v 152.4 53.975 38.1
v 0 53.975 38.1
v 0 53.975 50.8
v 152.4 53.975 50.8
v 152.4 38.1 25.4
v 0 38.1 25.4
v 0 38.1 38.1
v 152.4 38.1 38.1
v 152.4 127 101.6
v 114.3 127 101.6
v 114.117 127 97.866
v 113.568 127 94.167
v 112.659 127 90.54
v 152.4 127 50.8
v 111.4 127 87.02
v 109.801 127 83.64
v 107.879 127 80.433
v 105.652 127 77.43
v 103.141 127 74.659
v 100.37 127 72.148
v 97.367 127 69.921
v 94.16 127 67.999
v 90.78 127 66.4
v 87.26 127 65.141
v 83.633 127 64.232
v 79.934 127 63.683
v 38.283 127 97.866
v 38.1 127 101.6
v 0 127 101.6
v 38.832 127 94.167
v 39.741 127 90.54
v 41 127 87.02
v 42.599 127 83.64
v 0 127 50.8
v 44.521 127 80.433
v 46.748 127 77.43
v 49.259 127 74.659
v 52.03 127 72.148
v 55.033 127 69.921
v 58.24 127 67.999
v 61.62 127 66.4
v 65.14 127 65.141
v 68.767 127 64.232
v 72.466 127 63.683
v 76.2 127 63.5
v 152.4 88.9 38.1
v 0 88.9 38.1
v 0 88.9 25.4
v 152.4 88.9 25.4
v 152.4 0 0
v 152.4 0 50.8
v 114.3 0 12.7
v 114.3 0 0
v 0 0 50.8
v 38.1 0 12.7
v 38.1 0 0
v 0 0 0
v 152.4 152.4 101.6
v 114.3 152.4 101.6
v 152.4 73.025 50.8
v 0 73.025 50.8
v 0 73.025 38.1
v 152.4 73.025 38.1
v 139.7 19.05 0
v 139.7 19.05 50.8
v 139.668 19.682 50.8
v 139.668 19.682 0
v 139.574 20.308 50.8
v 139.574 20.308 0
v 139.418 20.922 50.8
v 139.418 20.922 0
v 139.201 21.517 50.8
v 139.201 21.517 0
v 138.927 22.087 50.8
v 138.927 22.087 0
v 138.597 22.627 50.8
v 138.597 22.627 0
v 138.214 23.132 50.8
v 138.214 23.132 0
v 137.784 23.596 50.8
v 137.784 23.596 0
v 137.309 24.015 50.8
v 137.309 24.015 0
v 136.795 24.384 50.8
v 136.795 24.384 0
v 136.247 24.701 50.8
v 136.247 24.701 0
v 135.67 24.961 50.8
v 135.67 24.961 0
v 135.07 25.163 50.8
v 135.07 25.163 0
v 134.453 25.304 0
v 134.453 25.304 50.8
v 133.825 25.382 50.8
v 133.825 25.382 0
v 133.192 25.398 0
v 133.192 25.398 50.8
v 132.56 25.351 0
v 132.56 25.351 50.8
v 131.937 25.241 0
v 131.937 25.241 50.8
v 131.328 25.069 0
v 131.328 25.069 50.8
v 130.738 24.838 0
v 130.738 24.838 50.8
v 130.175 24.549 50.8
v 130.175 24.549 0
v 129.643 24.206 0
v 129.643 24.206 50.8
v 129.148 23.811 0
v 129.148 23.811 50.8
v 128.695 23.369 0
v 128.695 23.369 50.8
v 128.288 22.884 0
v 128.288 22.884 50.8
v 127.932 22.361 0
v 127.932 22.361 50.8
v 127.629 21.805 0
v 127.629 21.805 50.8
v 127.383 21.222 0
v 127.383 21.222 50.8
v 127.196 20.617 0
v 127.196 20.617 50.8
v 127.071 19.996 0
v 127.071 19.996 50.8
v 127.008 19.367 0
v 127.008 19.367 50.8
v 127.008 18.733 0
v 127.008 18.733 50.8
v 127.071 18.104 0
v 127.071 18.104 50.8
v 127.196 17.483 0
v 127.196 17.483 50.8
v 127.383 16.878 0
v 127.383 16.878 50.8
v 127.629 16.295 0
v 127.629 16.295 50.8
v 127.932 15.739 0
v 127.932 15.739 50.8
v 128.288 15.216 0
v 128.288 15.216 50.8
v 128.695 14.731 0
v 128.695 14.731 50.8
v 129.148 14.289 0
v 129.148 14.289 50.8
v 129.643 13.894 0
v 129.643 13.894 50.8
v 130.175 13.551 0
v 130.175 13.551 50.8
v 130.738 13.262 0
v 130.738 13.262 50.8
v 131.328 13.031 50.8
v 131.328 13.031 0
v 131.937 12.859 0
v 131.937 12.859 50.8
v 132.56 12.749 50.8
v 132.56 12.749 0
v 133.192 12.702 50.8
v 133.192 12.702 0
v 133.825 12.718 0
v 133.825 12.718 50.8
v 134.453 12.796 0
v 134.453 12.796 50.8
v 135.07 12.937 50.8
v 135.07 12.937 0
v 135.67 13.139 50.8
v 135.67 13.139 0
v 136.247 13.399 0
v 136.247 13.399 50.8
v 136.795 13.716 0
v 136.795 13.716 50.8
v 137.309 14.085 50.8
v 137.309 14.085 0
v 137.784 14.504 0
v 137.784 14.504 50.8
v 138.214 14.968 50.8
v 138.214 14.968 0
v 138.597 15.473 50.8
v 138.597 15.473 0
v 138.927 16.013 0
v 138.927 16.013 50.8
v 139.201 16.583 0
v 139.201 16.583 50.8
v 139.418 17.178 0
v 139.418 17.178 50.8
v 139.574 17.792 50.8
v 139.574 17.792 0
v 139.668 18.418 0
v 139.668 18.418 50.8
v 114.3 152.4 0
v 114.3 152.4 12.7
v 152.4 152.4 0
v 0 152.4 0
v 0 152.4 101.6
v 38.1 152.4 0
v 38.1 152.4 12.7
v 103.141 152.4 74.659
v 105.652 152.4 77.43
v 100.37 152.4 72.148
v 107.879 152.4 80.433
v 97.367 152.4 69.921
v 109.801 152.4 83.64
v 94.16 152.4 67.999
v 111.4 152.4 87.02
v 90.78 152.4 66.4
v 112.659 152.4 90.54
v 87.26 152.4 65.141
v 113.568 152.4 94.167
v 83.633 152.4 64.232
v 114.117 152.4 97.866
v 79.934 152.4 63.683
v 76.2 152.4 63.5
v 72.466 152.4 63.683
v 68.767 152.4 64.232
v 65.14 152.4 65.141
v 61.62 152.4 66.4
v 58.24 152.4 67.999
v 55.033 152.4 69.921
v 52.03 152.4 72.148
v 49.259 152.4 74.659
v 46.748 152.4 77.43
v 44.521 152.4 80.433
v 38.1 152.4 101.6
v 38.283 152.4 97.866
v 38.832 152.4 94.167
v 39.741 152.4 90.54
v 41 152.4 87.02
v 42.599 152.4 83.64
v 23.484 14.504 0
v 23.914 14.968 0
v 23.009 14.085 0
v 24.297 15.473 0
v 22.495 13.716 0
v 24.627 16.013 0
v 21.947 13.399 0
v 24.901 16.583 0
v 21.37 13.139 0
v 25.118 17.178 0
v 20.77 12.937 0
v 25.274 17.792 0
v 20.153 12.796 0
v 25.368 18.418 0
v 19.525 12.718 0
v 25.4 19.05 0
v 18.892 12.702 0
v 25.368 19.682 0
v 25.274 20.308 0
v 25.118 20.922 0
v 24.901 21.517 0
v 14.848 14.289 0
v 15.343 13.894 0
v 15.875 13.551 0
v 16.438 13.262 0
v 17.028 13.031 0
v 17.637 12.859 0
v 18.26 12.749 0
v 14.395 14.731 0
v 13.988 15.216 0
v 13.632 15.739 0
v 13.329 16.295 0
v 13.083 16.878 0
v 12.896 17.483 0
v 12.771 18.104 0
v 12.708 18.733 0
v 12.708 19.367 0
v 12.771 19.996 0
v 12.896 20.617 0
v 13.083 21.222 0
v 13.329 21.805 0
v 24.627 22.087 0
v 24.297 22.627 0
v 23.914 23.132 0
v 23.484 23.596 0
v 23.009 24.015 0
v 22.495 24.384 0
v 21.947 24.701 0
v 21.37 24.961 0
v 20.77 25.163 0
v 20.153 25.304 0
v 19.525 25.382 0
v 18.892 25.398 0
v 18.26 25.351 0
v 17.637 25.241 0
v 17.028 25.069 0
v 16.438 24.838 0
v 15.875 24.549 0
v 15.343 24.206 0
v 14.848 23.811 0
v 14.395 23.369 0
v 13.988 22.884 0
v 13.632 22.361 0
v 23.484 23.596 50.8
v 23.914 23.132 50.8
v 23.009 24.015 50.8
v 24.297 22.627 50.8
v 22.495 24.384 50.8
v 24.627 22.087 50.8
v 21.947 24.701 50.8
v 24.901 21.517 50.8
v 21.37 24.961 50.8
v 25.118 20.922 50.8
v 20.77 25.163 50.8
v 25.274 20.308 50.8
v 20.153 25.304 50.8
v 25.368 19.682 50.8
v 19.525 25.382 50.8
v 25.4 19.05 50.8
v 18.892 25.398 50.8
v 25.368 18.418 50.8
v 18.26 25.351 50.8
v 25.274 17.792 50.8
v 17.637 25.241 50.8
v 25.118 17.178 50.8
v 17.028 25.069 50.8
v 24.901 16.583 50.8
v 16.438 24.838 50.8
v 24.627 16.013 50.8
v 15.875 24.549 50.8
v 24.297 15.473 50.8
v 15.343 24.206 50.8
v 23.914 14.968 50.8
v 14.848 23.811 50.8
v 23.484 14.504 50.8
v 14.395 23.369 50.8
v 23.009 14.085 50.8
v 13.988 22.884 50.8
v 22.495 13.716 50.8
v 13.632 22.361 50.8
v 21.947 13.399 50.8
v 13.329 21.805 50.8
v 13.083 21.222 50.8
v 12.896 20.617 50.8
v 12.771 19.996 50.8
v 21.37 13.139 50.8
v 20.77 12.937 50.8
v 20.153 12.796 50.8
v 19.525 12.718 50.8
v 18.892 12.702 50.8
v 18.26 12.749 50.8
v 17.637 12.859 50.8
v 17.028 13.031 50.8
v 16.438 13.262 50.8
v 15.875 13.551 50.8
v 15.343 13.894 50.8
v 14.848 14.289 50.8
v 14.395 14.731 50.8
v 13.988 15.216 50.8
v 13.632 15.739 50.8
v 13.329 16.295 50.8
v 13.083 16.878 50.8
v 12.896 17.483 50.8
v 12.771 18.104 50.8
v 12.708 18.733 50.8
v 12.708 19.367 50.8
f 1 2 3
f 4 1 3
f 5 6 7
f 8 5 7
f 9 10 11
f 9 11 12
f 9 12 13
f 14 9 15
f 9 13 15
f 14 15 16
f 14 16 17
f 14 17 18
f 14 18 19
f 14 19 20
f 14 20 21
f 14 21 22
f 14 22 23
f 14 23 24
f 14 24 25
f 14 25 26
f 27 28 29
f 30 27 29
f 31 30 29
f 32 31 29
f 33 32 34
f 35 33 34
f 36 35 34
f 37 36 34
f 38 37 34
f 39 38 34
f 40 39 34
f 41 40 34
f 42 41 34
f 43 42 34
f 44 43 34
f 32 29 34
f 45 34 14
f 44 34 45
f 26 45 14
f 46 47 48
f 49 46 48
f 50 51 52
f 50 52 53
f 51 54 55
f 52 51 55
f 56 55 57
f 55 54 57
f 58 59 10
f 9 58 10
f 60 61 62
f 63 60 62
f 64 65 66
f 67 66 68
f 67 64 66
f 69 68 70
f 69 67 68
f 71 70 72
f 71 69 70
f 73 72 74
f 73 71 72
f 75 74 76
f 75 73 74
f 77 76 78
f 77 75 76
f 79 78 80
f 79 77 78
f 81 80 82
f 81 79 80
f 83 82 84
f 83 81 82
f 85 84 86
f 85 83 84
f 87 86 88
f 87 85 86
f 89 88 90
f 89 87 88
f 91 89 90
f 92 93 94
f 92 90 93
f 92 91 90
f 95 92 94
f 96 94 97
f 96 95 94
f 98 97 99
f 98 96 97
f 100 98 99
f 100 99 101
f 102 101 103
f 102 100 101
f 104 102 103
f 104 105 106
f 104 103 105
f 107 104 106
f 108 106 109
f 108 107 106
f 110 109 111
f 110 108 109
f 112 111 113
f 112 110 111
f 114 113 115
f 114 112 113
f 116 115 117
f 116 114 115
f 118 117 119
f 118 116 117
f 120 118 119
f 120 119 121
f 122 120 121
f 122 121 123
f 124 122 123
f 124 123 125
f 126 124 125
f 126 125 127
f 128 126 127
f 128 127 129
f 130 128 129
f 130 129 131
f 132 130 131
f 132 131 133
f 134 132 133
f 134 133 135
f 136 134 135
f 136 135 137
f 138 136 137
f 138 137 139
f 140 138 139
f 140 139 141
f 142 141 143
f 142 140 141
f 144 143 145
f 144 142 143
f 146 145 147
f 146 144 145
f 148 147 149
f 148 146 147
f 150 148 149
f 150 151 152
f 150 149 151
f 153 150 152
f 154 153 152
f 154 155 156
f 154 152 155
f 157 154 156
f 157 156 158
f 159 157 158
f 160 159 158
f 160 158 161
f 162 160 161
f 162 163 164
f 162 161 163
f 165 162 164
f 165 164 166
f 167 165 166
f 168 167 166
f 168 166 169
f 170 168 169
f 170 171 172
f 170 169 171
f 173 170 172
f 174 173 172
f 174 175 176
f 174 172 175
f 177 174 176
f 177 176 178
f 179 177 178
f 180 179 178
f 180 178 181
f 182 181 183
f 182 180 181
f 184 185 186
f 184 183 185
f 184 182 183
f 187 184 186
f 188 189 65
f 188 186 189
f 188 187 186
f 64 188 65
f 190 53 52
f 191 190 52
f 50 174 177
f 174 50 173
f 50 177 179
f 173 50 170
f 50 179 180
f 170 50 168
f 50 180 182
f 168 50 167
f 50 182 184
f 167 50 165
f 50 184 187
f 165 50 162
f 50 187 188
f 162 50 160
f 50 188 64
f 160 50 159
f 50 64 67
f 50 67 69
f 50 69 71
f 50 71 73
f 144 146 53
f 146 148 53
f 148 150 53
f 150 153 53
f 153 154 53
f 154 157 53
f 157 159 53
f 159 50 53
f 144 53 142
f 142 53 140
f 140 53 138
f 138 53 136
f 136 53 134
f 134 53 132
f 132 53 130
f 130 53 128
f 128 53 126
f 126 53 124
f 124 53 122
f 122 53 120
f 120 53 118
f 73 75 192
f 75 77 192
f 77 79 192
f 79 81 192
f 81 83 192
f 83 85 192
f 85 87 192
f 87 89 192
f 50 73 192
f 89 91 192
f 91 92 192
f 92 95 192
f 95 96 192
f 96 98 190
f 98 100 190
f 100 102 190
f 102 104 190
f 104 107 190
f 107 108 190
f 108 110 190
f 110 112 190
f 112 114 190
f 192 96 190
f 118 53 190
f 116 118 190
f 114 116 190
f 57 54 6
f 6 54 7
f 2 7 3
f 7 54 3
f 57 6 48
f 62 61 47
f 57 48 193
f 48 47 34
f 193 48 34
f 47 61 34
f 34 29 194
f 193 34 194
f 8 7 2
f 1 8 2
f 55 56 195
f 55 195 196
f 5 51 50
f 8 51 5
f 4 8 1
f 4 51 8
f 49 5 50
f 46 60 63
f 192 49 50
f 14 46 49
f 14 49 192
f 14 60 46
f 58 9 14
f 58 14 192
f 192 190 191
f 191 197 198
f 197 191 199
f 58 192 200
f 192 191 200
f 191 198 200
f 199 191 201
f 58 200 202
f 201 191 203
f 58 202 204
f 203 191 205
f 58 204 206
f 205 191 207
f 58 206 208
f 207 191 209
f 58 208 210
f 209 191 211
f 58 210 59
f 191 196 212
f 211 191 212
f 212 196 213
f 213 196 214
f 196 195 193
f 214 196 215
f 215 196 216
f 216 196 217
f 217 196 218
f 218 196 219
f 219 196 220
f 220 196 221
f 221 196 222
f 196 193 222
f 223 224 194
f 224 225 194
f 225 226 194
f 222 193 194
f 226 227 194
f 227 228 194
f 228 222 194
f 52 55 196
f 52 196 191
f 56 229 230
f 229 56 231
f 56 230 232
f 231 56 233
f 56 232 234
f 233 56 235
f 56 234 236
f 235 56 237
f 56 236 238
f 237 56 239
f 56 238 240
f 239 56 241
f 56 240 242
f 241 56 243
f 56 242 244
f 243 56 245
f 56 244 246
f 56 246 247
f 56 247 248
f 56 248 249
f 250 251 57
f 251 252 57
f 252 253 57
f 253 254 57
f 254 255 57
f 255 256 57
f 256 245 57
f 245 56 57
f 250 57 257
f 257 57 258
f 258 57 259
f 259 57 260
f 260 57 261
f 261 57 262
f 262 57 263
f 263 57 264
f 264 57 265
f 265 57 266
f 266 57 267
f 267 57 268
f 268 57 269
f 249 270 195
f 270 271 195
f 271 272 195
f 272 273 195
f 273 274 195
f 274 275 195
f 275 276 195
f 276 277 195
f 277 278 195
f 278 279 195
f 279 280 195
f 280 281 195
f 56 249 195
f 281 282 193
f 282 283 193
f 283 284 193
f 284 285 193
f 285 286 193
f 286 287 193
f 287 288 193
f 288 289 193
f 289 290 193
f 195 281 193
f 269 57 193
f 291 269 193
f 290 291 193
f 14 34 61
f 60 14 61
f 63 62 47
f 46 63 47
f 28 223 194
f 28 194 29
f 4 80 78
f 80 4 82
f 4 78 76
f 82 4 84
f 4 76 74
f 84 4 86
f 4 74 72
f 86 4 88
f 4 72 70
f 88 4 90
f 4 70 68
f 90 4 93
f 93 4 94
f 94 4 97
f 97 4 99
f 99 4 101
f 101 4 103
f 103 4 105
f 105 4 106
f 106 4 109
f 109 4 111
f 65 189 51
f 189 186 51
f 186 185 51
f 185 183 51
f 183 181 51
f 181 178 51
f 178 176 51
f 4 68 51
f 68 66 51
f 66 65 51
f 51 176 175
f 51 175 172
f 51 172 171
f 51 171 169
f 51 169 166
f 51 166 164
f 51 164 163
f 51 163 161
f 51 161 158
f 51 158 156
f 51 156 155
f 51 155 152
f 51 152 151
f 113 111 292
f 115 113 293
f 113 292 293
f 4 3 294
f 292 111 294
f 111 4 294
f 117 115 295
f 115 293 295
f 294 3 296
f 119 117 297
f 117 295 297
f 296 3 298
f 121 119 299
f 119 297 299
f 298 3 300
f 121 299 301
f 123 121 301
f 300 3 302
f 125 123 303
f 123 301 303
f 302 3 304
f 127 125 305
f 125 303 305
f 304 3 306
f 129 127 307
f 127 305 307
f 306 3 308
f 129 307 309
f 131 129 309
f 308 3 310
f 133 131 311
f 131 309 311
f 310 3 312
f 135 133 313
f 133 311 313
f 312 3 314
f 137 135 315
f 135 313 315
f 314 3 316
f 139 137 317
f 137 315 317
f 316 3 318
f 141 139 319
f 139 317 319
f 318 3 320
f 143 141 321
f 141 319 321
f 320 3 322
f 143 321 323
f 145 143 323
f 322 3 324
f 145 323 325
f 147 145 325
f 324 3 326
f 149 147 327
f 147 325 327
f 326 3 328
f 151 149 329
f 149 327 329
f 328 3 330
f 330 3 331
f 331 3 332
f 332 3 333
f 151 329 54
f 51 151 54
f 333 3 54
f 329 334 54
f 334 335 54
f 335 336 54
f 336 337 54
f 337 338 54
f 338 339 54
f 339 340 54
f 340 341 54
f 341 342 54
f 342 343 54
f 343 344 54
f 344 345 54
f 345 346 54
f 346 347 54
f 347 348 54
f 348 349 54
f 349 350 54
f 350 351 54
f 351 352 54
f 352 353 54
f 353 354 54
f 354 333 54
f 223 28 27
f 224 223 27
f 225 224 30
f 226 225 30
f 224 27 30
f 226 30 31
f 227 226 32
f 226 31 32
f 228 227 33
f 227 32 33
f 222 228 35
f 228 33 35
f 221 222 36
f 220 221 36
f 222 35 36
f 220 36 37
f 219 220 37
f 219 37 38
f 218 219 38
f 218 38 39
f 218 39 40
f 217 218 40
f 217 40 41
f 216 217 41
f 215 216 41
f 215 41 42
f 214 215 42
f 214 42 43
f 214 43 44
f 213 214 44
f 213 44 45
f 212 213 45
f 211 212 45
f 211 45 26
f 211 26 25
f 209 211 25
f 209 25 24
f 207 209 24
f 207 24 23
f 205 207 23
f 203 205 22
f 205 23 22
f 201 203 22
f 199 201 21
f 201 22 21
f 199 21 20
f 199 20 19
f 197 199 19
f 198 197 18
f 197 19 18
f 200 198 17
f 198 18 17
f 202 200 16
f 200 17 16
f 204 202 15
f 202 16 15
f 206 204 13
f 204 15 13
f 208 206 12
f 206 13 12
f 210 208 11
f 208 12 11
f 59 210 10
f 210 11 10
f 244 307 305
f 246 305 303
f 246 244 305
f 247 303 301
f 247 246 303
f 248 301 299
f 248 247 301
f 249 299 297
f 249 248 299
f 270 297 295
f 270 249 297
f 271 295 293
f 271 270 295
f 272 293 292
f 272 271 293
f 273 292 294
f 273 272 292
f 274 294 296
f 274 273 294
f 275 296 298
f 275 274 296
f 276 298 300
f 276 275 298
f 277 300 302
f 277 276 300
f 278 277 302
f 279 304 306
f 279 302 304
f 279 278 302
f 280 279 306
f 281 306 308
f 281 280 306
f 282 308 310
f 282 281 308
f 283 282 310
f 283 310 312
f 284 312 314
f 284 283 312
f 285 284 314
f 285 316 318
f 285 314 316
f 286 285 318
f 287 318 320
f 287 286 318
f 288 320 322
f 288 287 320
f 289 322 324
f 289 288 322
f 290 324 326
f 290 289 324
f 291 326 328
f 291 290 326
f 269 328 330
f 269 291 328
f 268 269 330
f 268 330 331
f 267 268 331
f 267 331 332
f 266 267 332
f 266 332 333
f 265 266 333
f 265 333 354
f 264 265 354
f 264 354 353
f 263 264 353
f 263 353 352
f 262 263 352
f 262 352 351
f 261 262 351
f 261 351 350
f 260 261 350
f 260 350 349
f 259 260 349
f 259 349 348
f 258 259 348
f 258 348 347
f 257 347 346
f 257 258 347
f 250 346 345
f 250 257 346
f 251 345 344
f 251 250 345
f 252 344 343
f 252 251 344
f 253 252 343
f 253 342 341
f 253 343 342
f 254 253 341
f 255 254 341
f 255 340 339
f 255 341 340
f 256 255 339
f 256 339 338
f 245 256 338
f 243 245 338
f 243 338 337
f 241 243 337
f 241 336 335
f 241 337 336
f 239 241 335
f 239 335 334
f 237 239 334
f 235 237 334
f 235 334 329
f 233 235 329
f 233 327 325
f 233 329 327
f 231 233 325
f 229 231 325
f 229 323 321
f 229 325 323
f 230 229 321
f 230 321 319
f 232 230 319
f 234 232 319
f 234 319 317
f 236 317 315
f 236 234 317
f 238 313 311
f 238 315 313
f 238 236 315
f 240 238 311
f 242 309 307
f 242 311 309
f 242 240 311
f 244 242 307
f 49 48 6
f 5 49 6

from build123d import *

# Parameters (mm, degrees)
F1_DEPTH = 152.4
F2_W     = 76.2
F2_H     = 12.7
F3_DEPTH = 152.4
F5_DEPTH = 171.70927
F7_R     = 6.35
F8_DEPTH = 152.4


with BuildPart() as f1:
    # F0 (on Right) → F1 (new body)
    with BuildSketch(Plane.YZ):
        Polygon((0, 50.8), (0, 0), (152.4, 0), (152.4, 101.6), (127, 101.6), (127, 50.8), (73.025, 50.8), (73.025, 38.1), (88.9, 38.1), (88.9, 25.4), (38.1, 25.4), (38.1, 38.1), (53.975, 38.1), (53.975, 50.8), align=None)
    extrude(amount=F1_DEPTH)

    # F2 (on Front) → F3 (cut)
    with BuildSketch(Plane.XZ):
        with Locations((76.2, 6.35)):
            Rectangle(F2_W, F2_H)
    extrude(amount=-F3_DEPTH, mode=Mode.SUBTRACT)

    # F4 (on Front) → F5 (cut)
    with BuildSketch(Plane.XZ):
        with BuildLine():
            ThreePointArc((38.1, 101.6), (76.2, 63.5), (114.3, 101.6))
            Line((114.3, 101.6), (38.1, 101.6))
        make_face()
        with BuildLine():
            Line((38.1, 101.6), (114.3, 101.6))
            ThreePointArc((114.3, 101.6), (76.2, 139.7), (38.1, 101.6))
        make_face()
    extrude(amount=-F5_DEPTH, mode=Mode.SUBTRACT)

    # F7 (on Top) → F8 (cut)
    with BuildSketch(Plane.XY):
        with Locations((19.05, 19.05)):
            Circle(F7_R)
        with Locations((133.35, 19.05)):
            Circle(F7_R)
    extrude(amount=F8_DEPTH, mode=Mode.SUBTRACT)


solid = f1.part
